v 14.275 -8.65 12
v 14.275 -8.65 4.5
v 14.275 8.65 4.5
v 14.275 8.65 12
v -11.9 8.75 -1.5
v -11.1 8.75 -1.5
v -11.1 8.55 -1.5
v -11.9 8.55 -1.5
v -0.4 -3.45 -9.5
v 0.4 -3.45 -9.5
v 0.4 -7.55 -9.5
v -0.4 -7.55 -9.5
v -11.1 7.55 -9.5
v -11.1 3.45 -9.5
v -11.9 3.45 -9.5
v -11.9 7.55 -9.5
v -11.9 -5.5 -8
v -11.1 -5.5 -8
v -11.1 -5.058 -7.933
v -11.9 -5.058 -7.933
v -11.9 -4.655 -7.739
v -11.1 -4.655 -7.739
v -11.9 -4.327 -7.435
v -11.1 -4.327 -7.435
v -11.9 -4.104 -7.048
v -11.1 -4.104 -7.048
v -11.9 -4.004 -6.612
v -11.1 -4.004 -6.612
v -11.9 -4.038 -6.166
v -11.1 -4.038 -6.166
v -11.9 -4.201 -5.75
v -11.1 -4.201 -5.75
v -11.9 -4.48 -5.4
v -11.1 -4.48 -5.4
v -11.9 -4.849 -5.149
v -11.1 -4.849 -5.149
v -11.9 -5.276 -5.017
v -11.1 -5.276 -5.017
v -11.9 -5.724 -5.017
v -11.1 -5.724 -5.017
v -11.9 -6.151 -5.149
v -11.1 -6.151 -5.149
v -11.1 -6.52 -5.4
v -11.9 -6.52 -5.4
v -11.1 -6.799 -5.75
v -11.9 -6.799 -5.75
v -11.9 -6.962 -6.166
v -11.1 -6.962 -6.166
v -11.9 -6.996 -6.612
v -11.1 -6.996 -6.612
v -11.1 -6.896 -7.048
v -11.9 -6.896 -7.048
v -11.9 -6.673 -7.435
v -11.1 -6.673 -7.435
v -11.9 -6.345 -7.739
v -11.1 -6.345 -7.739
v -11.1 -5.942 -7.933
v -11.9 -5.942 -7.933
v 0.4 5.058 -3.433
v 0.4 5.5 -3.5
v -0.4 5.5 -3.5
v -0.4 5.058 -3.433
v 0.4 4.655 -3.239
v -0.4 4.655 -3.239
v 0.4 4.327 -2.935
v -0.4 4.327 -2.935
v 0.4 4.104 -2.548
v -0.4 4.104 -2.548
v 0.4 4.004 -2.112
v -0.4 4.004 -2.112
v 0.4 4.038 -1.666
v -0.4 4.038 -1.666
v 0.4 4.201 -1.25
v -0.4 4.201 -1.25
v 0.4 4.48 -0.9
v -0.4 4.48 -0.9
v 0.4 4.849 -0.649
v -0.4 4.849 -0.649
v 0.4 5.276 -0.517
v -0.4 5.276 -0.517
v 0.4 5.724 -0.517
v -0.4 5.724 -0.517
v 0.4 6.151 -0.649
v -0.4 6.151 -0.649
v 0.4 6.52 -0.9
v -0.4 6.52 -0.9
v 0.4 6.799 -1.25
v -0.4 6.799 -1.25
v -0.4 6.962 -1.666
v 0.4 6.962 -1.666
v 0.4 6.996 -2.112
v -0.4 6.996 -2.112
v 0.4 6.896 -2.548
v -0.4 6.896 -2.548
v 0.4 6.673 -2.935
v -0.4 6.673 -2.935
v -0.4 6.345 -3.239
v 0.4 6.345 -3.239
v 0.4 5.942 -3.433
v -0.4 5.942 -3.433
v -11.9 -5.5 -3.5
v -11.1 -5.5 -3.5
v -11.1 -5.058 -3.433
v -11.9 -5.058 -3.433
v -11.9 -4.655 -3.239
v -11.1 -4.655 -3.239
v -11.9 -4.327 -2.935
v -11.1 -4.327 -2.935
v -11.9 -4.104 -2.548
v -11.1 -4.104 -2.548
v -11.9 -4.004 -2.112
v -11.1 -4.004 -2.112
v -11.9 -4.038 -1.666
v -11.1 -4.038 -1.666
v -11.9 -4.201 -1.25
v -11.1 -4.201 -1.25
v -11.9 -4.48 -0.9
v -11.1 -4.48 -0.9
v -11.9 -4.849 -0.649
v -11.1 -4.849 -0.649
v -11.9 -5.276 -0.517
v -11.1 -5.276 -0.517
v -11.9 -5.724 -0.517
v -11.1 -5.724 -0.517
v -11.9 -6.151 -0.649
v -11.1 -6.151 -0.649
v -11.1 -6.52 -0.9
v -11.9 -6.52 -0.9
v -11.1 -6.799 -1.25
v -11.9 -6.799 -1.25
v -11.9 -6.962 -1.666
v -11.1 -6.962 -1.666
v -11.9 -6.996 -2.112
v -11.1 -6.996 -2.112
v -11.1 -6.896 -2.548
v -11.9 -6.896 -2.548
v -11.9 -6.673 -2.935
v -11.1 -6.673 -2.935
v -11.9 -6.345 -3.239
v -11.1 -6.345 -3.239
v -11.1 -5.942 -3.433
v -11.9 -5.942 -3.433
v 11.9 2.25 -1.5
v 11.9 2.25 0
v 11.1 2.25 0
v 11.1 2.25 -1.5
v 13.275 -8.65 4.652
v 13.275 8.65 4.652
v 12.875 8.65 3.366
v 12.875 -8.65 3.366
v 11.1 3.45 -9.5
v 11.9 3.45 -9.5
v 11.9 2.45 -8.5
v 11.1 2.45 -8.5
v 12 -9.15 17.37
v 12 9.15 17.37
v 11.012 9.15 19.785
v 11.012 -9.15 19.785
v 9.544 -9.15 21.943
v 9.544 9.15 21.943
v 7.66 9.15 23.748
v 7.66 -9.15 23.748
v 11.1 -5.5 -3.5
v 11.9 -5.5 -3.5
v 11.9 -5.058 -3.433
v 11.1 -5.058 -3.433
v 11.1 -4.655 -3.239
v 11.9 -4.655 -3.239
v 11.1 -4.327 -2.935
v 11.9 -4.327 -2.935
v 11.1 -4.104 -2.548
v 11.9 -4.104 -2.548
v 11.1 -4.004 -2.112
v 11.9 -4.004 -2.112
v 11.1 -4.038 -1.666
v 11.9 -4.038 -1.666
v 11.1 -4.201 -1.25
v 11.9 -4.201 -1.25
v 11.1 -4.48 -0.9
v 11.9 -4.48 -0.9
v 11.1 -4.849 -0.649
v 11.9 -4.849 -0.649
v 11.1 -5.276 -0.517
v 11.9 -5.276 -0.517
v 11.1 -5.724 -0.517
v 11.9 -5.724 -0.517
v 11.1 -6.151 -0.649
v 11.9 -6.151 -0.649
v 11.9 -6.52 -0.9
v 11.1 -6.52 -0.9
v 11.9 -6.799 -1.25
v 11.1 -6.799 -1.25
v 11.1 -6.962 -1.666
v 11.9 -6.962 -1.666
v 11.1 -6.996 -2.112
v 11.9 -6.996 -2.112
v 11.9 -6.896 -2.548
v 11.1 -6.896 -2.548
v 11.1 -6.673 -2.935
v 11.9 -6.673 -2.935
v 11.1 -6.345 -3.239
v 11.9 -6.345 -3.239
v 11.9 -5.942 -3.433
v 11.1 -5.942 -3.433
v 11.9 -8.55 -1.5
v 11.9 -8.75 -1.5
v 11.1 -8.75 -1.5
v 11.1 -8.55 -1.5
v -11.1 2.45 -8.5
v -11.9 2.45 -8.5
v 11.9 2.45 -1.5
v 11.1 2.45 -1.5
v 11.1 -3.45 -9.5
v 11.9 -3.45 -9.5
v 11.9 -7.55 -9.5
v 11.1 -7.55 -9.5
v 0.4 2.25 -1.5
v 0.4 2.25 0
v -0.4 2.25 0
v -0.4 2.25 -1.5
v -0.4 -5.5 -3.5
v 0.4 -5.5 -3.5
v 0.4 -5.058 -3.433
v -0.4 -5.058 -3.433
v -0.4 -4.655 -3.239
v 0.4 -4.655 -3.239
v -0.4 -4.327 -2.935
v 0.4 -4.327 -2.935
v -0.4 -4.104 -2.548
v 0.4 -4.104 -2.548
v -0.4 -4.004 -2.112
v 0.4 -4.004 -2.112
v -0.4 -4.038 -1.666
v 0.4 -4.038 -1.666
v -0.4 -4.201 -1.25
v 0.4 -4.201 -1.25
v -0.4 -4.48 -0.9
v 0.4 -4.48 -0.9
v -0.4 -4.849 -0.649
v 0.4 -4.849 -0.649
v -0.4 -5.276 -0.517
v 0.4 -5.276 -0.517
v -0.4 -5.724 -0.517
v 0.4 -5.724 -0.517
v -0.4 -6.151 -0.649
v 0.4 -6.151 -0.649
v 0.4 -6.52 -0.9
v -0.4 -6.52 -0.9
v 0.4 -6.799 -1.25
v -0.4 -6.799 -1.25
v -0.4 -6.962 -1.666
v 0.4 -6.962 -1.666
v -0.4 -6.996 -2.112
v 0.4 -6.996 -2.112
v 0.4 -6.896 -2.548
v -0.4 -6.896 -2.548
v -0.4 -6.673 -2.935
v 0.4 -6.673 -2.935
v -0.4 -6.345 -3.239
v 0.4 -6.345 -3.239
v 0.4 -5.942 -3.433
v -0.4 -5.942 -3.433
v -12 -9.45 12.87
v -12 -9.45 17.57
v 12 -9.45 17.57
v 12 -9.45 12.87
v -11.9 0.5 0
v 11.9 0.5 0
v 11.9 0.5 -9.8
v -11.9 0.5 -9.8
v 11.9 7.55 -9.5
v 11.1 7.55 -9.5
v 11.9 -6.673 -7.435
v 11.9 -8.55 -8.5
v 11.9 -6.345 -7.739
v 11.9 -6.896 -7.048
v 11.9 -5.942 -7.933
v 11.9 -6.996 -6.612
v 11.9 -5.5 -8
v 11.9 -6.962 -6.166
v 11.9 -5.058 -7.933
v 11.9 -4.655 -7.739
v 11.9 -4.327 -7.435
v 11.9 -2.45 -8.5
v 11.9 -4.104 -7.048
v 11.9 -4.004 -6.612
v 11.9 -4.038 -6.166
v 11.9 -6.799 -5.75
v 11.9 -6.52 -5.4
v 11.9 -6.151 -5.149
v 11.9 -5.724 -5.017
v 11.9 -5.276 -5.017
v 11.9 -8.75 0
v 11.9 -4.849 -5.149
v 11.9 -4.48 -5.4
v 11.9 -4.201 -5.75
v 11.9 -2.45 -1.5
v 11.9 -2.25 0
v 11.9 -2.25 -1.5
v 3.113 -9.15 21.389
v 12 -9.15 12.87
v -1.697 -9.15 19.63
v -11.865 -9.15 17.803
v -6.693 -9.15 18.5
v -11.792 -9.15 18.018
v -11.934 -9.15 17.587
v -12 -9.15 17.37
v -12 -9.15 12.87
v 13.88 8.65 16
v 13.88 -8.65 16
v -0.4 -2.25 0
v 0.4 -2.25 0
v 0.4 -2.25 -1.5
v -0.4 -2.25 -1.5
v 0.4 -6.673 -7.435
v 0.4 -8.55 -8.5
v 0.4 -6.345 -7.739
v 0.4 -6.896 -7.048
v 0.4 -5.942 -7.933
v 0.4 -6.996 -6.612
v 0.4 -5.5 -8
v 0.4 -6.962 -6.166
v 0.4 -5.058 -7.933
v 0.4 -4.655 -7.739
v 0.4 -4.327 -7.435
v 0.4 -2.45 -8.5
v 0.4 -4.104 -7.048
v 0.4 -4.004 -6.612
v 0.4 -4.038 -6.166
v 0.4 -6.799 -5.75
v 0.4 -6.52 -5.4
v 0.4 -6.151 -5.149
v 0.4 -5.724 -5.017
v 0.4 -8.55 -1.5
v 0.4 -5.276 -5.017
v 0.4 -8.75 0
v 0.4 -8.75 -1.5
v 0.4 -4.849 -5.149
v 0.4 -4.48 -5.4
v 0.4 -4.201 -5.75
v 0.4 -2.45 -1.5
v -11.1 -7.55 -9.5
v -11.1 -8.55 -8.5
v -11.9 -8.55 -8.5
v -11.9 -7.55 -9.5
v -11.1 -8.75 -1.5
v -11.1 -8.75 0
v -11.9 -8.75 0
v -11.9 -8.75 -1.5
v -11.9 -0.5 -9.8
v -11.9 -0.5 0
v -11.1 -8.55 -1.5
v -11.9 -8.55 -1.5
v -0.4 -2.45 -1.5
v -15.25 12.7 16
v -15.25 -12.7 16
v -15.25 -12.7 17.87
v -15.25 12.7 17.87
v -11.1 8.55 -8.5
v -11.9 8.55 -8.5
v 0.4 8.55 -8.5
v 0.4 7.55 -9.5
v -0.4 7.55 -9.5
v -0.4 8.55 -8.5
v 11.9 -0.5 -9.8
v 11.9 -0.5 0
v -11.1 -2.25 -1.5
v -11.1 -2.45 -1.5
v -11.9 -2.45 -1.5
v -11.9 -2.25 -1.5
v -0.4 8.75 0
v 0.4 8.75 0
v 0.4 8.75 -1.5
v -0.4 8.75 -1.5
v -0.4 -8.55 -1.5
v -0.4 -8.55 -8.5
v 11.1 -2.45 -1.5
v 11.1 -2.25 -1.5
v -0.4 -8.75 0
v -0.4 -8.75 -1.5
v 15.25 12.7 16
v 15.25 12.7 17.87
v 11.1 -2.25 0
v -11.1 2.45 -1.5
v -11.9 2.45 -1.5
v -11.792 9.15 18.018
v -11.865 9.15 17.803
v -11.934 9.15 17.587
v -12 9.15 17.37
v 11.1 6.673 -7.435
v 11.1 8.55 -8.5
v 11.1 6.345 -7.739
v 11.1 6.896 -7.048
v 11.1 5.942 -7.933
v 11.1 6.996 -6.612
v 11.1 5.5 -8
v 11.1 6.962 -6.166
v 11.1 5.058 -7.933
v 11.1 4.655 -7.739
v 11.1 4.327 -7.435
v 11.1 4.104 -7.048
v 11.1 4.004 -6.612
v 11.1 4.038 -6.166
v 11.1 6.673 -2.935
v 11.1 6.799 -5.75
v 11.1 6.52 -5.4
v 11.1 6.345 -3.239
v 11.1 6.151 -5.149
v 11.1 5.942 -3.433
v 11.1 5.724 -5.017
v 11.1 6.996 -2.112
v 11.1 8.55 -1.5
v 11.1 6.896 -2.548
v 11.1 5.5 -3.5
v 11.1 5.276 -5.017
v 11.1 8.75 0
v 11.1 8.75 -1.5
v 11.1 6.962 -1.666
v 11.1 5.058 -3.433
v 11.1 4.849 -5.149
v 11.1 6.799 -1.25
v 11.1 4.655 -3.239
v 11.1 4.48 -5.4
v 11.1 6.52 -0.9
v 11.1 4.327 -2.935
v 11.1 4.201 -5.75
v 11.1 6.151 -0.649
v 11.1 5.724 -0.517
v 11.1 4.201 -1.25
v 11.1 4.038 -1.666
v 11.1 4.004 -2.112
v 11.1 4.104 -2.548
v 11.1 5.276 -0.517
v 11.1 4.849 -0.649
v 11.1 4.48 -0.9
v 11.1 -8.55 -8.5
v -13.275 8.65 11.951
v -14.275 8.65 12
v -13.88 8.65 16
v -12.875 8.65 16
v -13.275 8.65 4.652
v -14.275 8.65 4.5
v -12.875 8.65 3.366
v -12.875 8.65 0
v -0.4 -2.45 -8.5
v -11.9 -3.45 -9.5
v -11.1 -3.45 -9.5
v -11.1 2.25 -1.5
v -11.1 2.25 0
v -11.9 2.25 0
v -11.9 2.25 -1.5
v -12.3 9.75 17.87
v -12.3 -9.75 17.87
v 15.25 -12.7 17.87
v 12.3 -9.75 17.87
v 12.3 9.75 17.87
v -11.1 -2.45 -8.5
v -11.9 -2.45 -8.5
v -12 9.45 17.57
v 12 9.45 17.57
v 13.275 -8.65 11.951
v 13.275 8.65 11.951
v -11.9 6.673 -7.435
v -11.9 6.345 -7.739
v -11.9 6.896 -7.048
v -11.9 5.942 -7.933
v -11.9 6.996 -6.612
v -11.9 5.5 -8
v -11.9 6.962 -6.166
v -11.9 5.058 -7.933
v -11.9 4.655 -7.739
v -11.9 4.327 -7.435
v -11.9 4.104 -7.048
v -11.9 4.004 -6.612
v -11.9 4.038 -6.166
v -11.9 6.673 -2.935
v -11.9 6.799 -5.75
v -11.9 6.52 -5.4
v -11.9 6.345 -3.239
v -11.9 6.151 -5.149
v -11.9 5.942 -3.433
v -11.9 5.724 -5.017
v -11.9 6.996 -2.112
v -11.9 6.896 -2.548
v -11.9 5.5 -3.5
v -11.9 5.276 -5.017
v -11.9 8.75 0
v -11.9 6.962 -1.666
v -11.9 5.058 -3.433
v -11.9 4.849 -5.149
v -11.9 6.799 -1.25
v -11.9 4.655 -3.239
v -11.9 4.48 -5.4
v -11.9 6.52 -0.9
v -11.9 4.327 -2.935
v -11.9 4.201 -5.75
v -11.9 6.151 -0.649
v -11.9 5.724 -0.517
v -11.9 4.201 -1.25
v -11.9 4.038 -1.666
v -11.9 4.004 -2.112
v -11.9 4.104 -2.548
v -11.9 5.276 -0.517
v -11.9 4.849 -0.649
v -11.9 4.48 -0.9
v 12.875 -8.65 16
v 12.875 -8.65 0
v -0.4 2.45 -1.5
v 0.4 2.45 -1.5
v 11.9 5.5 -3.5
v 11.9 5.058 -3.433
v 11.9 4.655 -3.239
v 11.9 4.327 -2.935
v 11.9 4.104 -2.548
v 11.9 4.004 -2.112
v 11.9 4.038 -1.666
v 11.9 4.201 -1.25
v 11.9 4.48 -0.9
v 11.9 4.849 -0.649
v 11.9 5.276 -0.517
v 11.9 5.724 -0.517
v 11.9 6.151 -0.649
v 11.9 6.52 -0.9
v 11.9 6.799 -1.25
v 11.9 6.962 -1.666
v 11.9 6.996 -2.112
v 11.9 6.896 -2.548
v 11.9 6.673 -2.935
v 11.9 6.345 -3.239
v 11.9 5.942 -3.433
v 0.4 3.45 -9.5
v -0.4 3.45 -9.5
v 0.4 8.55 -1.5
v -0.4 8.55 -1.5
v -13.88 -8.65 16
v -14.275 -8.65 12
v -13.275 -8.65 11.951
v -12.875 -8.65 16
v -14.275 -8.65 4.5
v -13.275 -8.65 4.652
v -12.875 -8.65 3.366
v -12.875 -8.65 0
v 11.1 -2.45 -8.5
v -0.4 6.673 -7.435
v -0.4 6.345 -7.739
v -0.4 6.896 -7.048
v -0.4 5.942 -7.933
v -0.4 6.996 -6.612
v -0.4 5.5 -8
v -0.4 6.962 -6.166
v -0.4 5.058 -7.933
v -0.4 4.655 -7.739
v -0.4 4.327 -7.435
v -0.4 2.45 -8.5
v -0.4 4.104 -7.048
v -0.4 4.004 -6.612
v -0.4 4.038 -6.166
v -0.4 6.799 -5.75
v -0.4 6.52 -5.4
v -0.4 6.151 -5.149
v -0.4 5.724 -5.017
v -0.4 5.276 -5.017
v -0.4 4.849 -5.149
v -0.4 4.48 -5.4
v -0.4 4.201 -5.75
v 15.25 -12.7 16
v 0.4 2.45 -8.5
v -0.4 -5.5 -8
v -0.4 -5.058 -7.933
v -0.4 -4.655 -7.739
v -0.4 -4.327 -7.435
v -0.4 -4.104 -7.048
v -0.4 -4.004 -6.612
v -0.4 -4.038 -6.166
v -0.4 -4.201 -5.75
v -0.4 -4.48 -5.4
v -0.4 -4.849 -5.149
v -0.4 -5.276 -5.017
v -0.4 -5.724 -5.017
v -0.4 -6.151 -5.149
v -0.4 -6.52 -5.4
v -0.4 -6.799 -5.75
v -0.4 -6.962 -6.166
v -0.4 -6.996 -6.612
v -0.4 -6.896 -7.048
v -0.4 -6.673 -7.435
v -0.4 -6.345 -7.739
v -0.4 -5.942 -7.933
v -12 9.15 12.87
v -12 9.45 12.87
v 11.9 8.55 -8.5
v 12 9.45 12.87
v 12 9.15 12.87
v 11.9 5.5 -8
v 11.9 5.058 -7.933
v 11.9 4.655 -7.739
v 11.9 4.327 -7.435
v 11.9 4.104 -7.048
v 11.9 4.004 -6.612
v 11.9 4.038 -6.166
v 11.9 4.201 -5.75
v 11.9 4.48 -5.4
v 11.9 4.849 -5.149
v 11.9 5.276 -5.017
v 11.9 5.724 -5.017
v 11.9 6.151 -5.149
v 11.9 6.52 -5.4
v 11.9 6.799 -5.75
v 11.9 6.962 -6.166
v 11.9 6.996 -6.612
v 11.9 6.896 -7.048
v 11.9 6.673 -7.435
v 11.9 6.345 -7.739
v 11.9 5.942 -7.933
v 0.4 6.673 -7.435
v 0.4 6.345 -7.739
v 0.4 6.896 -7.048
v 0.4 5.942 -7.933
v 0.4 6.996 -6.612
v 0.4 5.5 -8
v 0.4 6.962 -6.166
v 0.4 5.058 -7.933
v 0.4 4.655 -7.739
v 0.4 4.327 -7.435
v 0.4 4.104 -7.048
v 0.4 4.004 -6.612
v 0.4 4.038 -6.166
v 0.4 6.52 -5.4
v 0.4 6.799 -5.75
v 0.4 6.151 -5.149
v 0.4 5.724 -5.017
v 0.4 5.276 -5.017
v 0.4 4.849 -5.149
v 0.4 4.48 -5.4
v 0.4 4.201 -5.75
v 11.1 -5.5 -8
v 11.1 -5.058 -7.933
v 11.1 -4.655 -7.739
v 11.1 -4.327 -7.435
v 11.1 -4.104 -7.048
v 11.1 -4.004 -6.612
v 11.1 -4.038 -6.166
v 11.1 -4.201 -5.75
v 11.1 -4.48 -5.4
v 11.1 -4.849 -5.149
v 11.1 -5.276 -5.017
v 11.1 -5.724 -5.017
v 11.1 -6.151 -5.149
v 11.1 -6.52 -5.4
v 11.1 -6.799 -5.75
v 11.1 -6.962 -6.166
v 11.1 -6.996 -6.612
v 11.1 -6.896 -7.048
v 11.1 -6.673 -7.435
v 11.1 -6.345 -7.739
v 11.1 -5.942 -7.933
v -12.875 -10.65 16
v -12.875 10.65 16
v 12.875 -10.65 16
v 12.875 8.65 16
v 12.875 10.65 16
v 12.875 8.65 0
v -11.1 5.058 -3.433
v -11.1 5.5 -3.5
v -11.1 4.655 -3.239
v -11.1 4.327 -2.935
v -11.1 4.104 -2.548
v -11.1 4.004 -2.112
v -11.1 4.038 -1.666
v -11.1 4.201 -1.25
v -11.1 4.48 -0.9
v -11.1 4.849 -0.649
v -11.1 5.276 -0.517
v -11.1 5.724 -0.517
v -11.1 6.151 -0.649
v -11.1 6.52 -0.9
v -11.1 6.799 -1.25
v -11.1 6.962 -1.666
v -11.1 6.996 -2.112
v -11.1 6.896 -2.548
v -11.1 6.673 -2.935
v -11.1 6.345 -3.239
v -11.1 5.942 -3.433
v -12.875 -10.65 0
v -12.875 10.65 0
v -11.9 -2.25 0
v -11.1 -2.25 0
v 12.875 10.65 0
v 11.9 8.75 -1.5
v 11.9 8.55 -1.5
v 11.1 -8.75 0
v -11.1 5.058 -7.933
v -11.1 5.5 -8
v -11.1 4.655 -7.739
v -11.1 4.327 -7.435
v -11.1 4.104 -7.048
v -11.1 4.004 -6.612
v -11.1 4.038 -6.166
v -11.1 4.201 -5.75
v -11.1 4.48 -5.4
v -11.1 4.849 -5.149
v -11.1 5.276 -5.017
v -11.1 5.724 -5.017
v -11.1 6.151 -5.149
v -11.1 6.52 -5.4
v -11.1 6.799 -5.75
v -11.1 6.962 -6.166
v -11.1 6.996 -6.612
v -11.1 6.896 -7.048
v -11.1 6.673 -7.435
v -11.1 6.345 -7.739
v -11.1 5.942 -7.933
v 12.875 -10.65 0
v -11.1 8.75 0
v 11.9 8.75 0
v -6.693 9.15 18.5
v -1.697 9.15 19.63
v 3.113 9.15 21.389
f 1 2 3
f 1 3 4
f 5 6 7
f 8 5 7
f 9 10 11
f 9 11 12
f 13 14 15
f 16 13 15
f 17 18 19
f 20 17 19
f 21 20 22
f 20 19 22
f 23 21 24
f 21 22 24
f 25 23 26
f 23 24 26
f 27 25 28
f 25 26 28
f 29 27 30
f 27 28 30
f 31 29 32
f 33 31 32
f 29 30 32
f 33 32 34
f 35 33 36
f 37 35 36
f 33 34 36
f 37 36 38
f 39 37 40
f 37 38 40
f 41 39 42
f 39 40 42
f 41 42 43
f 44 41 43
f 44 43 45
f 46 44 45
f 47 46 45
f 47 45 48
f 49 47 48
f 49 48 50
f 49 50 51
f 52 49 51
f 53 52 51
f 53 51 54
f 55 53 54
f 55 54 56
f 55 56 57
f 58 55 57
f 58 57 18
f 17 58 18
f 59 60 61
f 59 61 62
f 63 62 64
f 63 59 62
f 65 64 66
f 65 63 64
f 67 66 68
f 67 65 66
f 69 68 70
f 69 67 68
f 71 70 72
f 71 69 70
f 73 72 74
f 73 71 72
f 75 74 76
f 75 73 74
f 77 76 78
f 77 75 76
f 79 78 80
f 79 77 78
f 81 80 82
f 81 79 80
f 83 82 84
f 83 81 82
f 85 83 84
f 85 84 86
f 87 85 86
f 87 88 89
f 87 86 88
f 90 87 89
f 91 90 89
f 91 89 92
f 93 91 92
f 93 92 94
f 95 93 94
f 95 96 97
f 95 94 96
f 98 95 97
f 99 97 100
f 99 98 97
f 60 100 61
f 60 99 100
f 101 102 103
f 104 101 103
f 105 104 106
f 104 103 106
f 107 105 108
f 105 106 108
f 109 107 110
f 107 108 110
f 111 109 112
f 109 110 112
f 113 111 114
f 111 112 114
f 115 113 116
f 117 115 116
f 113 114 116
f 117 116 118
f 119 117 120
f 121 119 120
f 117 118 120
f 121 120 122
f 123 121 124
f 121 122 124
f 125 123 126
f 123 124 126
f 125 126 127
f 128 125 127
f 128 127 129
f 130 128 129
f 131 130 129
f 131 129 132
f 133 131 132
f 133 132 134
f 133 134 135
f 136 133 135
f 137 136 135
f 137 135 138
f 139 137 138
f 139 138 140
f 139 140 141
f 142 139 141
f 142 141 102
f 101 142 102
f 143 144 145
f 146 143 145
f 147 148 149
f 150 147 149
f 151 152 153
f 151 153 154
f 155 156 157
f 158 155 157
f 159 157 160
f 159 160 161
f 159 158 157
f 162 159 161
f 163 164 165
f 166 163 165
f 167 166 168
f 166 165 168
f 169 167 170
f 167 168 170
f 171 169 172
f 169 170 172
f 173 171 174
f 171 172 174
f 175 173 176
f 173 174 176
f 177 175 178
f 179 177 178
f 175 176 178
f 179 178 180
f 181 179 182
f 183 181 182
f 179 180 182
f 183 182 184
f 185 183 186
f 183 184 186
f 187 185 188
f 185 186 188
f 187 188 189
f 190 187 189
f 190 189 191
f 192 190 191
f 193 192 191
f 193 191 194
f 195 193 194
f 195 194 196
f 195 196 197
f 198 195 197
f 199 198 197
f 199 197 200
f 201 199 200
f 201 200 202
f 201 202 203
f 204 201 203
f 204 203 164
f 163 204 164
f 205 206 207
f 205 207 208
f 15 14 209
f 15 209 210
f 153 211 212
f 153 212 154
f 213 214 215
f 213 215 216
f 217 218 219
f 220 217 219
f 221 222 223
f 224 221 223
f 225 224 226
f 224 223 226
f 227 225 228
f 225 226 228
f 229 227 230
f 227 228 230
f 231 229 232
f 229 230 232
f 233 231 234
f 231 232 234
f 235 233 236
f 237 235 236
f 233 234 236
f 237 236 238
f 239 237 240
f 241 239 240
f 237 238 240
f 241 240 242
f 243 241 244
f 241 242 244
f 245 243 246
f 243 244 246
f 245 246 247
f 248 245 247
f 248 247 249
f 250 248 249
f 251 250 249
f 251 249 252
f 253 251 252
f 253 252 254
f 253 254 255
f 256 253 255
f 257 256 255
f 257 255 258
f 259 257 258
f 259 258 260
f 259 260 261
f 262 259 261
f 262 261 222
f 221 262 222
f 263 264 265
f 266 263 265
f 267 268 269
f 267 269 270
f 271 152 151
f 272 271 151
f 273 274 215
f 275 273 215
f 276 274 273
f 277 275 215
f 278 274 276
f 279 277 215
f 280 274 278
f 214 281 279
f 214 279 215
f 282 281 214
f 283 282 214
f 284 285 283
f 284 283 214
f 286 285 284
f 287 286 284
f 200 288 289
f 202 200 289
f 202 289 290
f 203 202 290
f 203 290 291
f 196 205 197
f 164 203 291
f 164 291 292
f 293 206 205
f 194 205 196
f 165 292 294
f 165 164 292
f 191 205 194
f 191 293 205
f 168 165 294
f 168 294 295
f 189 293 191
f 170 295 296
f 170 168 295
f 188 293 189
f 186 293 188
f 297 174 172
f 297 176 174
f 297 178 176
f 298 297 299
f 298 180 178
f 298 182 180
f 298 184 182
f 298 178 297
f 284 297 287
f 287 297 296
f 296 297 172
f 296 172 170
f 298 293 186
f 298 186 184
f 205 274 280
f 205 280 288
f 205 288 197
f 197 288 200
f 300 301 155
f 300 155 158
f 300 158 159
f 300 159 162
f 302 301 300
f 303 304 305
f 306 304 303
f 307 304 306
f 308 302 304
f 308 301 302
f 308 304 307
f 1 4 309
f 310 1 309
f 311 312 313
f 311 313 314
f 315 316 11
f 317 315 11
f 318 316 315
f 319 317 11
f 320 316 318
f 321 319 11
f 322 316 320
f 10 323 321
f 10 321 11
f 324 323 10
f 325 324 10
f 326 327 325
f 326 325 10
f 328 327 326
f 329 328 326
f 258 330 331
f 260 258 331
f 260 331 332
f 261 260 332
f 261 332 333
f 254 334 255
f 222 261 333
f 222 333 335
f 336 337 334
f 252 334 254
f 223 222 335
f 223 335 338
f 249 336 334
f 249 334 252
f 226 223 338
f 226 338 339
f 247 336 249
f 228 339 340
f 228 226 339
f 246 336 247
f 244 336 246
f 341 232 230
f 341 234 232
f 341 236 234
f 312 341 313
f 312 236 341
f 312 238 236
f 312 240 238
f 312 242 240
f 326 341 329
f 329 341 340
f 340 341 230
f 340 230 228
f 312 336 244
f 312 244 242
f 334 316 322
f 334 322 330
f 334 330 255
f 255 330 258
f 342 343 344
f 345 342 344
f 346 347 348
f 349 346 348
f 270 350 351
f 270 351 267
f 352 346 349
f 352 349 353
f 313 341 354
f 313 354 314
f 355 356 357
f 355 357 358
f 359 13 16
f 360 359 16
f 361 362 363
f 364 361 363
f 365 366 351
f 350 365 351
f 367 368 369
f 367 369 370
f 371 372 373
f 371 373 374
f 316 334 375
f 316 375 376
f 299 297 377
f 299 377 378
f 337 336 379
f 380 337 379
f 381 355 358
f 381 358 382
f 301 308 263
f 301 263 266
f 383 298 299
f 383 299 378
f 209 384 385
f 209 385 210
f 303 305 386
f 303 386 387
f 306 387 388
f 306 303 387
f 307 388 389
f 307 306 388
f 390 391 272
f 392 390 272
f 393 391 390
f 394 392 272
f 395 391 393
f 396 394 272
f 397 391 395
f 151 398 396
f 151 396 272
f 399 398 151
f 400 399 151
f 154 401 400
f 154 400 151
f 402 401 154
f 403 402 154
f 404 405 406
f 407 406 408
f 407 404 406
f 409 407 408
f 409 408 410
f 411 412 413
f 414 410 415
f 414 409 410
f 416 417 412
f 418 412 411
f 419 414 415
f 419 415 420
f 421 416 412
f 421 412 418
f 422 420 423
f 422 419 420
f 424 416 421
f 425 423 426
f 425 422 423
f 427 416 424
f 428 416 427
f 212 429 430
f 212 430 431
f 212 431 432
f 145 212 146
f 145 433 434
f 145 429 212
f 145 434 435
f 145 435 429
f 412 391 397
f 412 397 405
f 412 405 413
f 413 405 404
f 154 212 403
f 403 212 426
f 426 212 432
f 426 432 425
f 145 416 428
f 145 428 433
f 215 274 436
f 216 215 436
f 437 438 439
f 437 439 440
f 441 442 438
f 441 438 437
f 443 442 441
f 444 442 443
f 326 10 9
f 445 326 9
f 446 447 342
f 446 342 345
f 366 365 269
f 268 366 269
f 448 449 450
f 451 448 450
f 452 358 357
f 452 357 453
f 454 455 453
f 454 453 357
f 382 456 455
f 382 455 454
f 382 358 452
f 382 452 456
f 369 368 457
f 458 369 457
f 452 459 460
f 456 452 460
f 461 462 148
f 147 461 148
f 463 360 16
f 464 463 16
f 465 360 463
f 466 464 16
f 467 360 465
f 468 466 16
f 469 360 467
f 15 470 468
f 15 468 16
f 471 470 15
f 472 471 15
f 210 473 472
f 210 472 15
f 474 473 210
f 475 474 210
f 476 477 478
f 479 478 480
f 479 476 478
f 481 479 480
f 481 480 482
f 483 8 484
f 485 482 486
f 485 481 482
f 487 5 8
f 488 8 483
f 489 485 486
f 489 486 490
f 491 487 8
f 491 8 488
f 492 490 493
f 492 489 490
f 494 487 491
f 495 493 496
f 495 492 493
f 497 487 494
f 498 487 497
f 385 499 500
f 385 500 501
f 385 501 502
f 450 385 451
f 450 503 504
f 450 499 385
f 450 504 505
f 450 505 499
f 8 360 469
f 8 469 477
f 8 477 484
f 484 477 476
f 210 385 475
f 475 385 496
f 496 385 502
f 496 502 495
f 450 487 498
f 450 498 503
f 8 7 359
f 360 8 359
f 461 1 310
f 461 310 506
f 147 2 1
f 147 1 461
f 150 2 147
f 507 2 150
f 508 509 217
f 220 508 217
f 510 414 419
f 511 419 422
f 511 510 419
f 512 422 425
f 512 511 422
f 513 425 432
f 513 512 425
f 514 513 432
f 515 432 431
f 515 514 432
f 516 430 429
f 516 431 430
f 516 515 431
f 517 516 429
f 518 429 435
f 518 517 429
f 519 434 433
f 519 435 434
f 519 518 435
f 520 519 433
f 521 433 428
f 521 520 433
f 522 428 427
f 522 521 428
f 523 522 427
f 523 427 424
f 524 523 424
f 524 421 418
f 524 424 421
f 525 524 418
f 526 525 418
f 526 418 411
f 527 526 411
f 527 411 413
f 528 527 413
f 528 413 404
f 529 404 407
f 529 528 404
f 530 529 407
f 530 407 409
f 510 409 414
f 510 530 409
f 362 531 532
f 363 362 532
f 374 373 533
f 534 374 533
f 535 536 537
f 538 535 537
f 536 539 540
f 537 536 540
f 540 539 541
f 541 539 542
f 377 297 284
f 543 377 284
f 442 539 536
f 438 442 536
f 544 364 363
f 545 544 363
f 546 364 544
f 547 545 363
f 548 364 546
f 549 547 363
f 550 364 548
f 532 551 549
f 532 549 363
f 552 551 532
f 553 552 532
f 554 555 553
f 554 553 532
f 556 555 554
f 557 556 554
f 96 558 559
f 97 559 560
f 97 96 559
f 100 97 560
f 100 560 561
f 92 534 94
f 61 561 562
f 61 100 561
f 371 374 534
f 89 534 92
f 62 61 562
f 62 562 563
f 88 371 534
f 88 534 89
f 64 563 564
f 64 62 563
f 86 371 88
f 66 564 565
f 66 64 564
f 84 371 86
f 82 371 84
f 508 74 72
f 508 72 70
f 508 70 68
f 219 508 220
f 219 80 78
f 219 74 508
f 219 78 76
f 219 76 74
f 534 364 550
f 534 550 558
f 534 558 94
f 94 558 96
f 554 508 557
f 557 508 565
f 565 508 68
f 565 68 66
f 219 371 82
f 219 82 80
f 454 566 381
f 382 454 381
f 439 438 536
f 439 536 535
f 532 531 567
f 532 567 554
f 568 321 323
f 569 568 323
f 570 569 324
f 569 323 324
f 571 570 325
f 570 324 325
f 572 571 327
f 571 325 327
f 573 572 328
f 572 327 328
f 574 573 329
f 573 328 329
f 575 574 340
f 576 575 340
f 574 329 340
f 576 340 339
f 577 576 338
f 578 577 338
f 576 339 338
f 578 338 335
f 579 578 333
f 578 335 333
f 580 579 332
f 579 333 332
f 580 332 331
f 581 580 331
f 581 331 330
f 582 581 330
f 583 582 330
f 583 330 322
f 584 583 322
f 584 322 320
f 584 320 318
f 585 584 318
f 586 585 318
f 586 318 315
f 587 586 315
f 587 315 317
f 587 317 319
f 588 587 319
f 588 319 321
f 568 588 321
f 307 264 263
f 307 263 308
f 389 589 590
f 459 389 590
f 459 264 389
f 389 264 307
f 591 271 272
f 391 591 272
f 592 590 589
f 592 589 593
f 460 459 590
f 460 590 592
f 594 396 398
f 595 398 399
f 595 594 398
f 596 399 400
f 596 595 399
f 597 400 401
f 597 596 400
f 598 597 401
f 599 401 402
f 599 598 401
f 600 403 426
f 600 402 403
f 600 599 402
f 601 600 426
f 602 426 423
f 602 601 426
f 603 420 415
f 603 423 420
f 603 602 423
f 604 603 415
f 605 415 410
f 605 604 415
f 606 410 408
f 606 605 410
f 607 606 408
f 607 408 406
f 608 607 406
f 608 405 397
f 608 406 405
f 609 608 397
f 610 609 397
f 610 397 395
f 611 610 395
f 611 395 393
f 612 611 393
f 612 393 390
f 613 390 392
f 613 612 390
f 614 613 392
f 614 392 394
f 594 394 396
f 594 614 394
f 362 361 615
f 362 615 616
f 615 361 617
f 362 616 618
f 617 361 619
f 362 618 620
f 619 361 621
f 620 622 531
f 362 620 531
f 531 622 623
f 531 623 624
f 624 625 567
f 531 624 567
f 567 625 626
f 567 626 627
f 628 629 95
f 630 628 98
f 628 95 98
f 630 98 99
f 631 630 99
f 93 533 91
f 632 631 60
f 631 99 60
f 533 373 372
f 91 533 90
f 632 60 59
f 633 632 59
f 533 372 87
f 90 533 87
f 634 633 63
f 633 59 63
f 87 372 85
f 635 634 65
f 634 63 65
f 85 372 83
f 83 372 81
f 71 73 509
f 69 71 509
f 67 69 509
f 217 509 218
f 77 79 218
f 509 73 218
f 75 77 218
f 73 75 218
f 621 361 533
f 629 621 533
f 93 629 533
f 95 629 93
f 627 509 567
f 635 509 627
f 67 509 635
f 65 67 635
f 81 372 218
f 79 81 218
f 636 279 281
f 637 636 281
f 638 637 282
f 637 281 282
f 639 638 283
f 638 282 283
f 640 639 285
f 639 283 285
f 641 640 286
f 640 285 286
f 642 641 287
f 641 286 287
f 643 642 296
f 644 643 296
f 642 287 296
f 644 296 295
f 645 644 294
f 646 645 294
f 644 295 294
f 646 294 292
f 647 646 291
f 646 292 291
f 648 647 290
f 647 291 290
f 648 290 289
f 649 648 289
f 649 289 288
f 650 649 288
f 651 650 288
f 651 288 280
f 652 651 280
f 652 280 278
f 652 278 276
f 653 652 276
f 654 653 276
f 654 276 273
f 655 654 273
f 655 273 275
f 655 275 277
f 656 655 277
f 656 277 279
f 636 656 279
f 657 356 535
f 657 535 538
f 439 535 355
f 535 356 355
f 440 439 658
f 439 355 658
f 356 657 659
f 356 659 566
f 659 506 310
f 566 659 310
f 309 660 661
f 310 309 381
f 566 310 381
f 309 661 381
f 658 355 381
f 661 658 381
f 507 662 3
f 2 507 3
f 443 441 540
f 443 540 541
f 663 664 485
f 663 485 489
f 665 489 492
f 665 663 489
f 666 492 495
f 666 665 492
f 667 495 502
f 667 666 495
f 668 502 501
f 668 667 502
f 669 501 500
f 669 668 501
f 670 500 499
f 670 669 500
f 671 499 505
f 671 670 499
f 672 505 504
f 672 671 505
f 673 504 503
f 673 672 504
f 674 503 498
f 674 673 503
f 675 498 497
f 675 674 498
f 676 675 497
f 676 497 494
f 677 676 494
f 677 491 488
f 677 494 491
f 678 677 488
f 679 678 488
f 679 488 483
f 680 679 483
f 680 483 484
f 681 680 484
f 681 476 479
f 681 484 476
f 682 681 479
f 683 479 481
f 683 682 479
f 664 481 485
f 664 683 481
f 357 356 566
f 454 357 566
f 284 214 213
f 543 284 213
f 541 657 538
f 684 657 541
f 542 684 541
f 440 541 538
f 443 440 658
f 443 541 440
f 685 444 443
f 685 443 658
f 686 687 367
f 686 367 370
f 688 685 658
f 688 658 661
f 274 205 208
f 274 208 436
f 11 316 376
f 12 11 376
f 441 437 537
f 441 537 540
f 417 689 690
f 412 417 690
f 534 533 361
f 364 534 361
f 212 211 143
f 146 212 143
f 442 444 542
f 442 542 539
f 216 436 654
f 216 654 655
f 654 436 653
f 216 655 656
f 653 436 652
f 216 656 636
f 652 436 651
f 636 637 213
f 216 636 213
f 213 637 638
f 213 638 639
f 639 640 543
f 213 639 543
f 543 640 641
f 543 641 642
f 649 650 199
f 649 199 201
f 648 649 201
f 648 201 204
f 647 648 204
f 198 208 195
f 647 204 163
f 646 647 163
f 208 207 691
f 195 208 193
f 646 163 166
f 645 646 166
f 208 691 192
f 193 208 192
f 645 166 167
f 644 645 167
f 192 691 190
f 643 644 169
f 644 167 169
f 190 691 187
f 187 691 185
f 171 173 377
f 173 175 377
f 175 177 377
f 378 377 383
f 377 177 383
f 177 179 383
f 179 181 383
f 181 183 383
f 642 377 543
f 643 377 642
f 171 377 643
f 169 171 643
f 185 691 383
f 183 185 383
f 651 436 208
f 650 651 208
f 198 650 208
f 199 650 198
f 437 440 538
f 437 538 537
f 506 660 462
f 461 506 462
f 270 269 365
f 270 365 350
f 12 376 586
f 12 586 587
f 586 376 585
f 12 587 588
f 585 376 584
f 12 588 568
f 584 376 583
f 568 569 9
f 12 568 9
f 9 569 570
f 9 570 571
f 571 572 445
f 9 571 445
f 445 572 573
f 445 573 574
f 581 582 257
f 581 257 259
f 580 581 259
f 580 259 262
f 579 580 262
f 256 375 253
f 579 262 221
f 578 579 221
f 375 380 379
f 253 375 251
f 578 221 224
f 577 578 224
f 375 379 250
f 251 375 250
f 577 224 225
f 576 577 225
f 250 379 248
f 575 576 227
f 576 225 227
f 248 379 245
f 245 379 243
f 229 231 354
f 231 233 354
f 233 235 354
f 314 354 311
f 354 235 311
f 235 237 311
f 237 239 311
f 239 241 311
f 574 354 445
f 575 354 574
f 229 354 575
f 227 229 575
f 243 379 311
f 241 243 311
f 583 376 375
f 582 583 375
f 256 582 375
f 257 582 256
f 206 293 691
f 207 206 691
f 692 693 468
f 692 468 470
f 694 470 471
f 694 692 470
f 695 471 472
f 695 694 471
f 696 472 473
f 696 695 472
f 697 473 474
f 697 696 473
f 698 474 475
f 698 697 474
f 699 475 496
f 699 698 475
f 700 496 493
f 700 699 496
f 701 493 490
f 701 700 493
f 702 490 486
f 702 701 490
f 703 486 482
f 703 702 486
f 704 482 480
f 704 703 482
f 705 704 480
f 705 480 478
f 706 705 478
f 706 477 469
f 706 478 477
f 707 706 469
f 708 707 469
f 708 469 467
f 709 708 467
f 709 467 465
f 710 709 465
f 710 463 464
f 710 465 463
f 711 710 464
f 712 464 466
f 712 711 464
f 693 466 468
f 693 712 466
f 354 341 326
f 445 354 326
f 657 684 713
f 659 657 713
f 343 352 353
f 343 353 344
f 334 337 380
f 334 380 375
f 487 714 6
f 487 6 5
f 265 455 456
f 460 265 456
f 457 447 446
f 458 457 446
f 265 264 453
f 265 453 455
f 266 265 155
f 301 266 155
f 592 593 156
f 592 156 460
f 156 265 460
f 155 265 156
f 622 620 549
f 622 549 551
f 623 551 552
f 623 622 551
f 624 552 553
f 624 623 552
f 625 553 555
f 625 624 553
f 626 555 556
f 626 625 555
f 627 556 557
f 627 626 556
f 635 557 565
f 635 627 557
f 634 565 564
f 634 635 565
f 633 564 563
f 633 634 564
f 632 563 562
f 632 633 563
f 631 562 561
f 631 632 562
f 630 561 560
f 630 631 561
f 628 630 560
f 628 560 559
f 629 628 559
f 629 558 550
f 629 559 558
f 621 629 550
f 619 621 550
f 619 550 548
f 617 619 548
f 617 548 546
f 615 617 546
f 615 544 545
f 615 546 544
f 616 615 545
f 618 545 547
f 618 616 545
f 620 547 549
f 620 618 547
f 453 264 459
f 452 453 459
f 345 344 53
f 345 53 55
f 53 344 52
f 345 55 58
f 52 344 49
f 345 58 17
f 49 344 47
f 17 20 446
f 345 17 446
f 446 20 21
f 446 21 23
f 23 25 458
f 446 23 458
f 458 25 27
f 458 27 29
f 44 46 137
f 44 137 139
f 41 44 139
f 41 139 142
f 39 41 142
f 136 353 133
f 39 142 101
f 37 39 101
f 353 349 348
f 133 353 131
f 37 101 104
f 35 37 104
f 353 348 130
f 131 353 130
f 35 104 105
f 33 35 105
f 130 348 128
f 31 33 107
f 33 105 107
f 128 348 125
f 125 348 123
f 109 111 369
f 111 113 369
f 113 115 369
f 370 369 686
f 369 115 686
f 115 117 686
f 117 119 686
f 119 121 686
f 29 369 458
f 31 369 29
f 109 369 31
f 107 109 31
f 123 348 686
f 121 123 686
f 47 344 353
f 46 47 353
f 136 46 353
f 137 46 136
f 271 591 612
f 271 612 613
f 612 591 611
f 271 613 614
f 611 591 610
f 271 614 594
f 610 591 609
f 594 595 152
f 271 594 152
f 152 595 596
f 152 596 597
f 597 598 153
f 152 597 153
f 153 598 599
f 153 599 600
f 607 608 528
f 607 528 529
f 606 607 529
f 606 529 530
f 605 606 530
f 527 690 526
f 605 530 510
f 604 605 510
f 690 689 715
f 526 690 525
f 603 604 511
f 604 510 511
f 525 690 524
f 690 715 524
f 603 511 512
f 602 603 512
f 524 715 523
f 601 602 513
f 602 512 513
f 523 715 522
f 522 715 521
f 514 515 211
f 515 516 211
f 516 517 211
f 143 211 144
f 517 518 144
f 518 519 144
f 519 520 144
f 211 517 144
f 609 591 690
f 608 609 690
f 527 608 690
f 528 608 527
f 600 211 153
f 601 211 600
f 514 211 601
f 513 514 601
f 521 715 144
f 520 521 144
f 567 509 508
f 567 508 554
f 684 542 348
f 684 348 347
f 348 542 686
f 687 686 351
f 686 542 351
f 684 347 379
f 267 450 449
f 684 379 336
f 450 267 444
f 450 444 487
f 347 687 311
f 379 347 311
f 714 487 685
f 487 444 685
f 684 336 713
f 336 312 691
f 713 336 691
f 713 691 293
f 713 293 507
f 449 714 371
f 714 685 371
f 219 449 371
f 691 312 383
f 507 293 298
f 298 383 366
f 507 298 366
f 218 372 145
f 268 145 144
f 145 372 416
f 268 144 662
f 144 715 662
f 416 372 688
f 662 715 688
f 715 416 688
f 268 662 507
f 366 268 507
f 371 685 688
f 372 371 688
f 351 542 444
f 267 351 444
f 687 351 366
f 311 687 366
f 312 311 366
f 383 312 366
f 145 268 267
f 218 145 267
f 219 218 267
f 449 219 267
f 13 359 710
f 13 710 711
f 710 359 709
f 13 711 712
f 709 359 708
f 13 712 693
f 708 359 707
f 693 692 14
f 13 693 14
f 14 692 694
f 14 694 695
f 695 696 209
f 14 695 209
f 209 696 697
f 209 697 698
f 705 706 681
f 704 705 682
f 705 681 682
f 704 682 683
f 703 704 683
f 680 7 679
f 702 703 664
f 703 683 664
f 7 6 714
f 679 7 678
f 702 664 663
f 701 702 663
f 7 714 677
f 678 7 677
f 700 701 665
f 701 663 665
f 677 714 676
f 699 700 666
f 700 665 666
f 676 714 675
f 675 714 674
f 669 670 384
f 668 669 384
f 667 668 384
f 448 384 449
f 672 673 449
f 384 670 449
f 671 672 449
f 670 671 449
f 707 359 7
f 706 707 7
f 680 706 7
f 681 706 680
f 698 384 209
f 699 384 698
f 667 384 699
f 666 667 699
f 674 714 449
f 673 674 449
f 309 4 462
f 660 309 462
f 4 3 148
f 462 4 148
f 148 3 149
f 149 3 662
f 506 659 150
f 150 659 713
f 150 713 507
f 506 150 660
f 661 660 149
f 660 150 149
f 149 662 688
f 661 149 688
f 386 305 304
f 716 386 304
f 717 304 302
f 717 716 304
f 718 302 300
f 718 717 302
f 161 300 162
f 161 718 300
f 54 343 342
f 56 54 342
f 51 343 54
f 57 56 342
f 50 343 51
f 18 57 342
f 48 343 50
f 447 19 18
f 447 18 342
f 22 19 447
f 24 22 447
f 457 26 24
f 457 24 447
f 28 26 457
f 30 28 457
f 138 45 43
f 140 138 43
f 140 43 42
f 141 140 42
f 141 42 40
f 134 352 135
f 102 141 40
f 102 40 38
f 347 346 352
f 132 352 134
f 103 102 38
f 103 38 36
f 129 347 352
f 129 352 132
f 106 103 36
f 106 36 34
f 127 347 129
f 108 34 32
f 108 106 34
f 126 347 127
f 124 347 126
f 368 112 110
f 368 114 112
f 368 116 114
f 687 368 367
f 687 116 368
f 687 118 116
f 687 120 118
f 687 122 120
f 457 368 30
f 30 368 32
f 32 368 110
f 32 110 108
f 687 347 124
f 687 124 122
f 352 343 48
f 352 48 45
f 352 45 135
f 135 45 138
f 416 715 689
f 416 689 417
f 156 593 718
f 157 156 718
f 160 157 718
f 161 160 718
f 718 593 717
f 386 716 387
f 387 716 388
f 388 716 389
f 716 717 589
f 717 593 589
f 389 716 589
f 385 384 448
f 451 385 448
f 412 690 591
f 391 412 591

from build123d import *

# Parameters (mm, degrees)
SKETCH1_W                = 25.75
SKETCH1_H                = 21.3
BOSS_EXTRUDE1_DEPTH      = 16
SKETCH3_W                = 30.5
SKETCH3_H                = 25.4
BOSS_EXTRUDE3_DEPTH      = 1.87
SKETCH4_W                = 23.8
SKETCH4_H                = 1
BOSS_EXTRUDE4_DEPTH      = 9.8
SKETCH5_W                = 0.8
SKETCH5_H                = 6.5
BOSS_EXTRUDE5_DEPTH      = 9.5
SKETCH6_W                = 8
SKETCH6_H                = 0.2
CUT_EXTRUDE1_DEPTH       = 35.896266276
CHAMFER1_SIZE            = 1
SKETCH7_R                = 1.5
CUT_EXTRUDE2_DEPTH       = 35.896266276
CHAMFER1_OF_MIRROR1_SIZE = 1
BOSS_EXTRUDE6_START      = -2
BOSS_EXTRUDE6_DEPTH      = 17.3
SKETCH9_W                = 24
SKETCH9_H                = 18.9
CUT_EXTRUDE3_DEPTH       = 5
SKETCH10_R               = 12.5
BOSS_EXTRUDE7_DEPTH      = 9.15
CUT_EXTRUDE4_DEPTH       = 34.003475575
CUT_EXTRUDE4_DEPTH_BACK  = 34.003475575
SKETCH11_R               = 40
CHAMFER2_SIZE            = 0.3


with BuildPart() as part:
    # Sketch1 → Boss-Extrude1 (new body)
    with BuildSketch(Plane.XY):
        Rectangle(SKETCH1_W, SKETCH1_H)
    extrude(amount=BOSS_EXTRUDE1_DEPTH)

    # Sketch3 → Boss-Extrude3 (add)
    with BuildSketch(Plane.XY.offset(16)):
        Rectangle(SKETCH3_W, SKETCH3_H)
    extrude(amount=BOSS_EXTRUDE3_DEPTH)

    # Sketch4 → Boss-Extrude4 (add)
    with BuildSketch(Plane(origin=(0, 0, 0), x_dir=(-1, 0, 0), z_dir=(0, 0, -1))):
        Rectangle(SKETCH4_W, SKETCH4_H)
    extrude(amount=BOSS_EXTRUDE4_DEPTH)

    # Sketch5 → Boss-Extrude5 (add)
    with BuildSketch(Plane(origin=(0, 0, 0), x_dir=(-1, 0, 0), z_dir=(0, 0, -1))):
        with Locations((11.5, -5.5)):
            Rectangle(SKETCH5_W, SKETCH5_H)
        with Locations((0, -5.5)):
            Rectangle(SKETCH5_W, SKETCH5_H)
        with Locations((-11.5, -5.5)):
            Rectangle(SKETCH5_W, SKETCH5_H)
    boss_extrude5 = extrude(amount=BOSS_EXTRUDE5_DEPTH)

    # Sketch6 → Cut-Extrude1 (cut, through all)
    with BuildSketch(Plane(origin=(11.9, 0, 0), x_dir=(0, 0, -1), z_dir=(1, 0, 0))):
        with Locations((5.5, -2.35)):
            Rectangle(SKETCH6_W, SKETCH6_H)
        with Locations((5.5, -8.65)):
            Rectangle(SKETCH6_W, SKETCH6_H)
    cut_extrude1 = extrude(amount=-CUT_EXTRUDE1_DEPTH, mode=Mode.SUBTRACT)

    # Chamfer1
    chamfer1_edges = [part.edges().sort_by_distance(p)[0] for p in [
        (-11.5, -2.45, -9.5),
        (0, -2.45, -9.5),
        (-11.5, -8.55, -9.5),
        (0, -8.55, -9.5),
        (11.5, -8.55, -9.5),
        (11.5, -2.45, -9.5),
    ]]
    chamfer(chamfer1_edges, length=CHAMFER1_SIZE)

    # Sketch7 → Cut-Extrude2 (cut, through all)
    with BuildSketch(Plane(origin=(11.9, 0, 0), x_dir=(0, 0, -1), z_dir=(1, 0, 0))):
        with Locations((6.5, -5.5)):
            Circle(SKETCH7_R)
        with Locations((2, -5.5)):
            Circle(SKETCH7_R)
    cut_extrude2 = extrude(amount=-CUT_EXTRUDE2_DEPTH, mode=Mode.SUBTRACT)

    # Mirror1: Boss-Extrude5, Cut-Extrude1, Cut-Extrude2 across plane
    add(boss_extrude5.mirror(Plane(origin=(0, 0, 0), x_dir=(0, 0, 1), z_dir=(0, -1, 0))))
    add(cut_extrude1.mirror(Plane(origin=(0, 0, 0), x_dir=(0, 0, 1), z_dir=(0, -1, 0))), mode=Mode.SUBTRACT)
    add(cut_extrude2.mirror(Plane(origin=(0, 0, 0), x_dir=(0, 0, 1), z_dir=(0, -1, 0))), mode=Mode.SUBTRACT)

    # Chamfer1 of Mirror1
    chamfer1_of_mirror1_edges = [part.edges().sort_by_distance(p)[0] for p in [
        (-11.5, 2.45, -9.5),
        (0, 2.45, -9.5),
        (-11.5, 8.55, -9.5),
        (0, 8.55, -9.5),
        (11.5, 8.55, -9.5),
        (11.5, 2.45, -9.5),
    ]]
    chamfer(chamfer1_of_mirror1_edges, length=CHAMFER1_OF_MIRROR1_SIZE)

    # Sketch8 → Boss-Extrude6 (add)
    with BuildSketch(Plane(origin=(0, 10.65, 0), x_dir=(1, 0, 0), z_dir=(0, 1, 0)).offset(BOSS_EXTRUDE6_START)):
        Polygon((-12.875, 0), (-14.275, -4.5), (-14.275, -12), (-13.879867215, -16), (-12.875, -16), (-13.275, -11.95072831), (-13.275, -4.651963334), (-12.875, -3.366249048), align=None)
    boss_extrude6 = extrude(amount=-BOSS_EXTRUDE6_DEPTH)

    # Mirror2: Boss-Extrude6 across plane
    add(boss_extrude6.mirror(Plane.ZY))

    # Sketch9 → Cut-Extrude3 (cut)
    with BuildSketch(Plane.XY.offset(17.87)):
        Rectangle(SKETCH9_W, SKETCH9_H)
    extrude(amount=-CUT_EXTRUDE3_DEPTH, mode=Mode.SUBTRACT)

    # Sketch10 → Boss-Extrude7 (add, symmetric)
    with BuildSketch(Plane(origin=(0, 0, 0), x_dir=(-1, 0, 0), z_dir=(0, -1, 0))):
        with Locations((0, -13.87)):
            Circle(SKETCH10_R)
    extrude(amount=BOSS_EXTRUDE7_DEPTH, both=True)

    # Sketch11 → Cut-Extrude4 (cut, two sides: drawn at the far end of the back side and taken through both)
    with BuildSketch(Plane(origin=(0, 0, 0), x_dir=(-1, 0, 0), z_dir=(0, -1, 0)).offset(-CUT_EXTRUDE4_DEPTH_BACK)):
        with Locations((13, -58)):
            Circle(SKETCH11_R)
    extrude(amount=CUT_EXTRUDE4_DEPTH + CUT_EXTRUDE4_DEPTH_BACK, mode=Mode.SUBTRACT)

    # Chamfer2
    chamfer2_edges = [part.edges().sort_by_distance(p)[0] for p in [
        (-12, 0, 17.87),
        (0, 9.45, 17.87),
        (0, -9.45, 17.87),
        (12, 0, 17.87),
    ]]
    chamfer(chamfer2_edges, length=CHAMFER2_SIZE)


solid = part.part
